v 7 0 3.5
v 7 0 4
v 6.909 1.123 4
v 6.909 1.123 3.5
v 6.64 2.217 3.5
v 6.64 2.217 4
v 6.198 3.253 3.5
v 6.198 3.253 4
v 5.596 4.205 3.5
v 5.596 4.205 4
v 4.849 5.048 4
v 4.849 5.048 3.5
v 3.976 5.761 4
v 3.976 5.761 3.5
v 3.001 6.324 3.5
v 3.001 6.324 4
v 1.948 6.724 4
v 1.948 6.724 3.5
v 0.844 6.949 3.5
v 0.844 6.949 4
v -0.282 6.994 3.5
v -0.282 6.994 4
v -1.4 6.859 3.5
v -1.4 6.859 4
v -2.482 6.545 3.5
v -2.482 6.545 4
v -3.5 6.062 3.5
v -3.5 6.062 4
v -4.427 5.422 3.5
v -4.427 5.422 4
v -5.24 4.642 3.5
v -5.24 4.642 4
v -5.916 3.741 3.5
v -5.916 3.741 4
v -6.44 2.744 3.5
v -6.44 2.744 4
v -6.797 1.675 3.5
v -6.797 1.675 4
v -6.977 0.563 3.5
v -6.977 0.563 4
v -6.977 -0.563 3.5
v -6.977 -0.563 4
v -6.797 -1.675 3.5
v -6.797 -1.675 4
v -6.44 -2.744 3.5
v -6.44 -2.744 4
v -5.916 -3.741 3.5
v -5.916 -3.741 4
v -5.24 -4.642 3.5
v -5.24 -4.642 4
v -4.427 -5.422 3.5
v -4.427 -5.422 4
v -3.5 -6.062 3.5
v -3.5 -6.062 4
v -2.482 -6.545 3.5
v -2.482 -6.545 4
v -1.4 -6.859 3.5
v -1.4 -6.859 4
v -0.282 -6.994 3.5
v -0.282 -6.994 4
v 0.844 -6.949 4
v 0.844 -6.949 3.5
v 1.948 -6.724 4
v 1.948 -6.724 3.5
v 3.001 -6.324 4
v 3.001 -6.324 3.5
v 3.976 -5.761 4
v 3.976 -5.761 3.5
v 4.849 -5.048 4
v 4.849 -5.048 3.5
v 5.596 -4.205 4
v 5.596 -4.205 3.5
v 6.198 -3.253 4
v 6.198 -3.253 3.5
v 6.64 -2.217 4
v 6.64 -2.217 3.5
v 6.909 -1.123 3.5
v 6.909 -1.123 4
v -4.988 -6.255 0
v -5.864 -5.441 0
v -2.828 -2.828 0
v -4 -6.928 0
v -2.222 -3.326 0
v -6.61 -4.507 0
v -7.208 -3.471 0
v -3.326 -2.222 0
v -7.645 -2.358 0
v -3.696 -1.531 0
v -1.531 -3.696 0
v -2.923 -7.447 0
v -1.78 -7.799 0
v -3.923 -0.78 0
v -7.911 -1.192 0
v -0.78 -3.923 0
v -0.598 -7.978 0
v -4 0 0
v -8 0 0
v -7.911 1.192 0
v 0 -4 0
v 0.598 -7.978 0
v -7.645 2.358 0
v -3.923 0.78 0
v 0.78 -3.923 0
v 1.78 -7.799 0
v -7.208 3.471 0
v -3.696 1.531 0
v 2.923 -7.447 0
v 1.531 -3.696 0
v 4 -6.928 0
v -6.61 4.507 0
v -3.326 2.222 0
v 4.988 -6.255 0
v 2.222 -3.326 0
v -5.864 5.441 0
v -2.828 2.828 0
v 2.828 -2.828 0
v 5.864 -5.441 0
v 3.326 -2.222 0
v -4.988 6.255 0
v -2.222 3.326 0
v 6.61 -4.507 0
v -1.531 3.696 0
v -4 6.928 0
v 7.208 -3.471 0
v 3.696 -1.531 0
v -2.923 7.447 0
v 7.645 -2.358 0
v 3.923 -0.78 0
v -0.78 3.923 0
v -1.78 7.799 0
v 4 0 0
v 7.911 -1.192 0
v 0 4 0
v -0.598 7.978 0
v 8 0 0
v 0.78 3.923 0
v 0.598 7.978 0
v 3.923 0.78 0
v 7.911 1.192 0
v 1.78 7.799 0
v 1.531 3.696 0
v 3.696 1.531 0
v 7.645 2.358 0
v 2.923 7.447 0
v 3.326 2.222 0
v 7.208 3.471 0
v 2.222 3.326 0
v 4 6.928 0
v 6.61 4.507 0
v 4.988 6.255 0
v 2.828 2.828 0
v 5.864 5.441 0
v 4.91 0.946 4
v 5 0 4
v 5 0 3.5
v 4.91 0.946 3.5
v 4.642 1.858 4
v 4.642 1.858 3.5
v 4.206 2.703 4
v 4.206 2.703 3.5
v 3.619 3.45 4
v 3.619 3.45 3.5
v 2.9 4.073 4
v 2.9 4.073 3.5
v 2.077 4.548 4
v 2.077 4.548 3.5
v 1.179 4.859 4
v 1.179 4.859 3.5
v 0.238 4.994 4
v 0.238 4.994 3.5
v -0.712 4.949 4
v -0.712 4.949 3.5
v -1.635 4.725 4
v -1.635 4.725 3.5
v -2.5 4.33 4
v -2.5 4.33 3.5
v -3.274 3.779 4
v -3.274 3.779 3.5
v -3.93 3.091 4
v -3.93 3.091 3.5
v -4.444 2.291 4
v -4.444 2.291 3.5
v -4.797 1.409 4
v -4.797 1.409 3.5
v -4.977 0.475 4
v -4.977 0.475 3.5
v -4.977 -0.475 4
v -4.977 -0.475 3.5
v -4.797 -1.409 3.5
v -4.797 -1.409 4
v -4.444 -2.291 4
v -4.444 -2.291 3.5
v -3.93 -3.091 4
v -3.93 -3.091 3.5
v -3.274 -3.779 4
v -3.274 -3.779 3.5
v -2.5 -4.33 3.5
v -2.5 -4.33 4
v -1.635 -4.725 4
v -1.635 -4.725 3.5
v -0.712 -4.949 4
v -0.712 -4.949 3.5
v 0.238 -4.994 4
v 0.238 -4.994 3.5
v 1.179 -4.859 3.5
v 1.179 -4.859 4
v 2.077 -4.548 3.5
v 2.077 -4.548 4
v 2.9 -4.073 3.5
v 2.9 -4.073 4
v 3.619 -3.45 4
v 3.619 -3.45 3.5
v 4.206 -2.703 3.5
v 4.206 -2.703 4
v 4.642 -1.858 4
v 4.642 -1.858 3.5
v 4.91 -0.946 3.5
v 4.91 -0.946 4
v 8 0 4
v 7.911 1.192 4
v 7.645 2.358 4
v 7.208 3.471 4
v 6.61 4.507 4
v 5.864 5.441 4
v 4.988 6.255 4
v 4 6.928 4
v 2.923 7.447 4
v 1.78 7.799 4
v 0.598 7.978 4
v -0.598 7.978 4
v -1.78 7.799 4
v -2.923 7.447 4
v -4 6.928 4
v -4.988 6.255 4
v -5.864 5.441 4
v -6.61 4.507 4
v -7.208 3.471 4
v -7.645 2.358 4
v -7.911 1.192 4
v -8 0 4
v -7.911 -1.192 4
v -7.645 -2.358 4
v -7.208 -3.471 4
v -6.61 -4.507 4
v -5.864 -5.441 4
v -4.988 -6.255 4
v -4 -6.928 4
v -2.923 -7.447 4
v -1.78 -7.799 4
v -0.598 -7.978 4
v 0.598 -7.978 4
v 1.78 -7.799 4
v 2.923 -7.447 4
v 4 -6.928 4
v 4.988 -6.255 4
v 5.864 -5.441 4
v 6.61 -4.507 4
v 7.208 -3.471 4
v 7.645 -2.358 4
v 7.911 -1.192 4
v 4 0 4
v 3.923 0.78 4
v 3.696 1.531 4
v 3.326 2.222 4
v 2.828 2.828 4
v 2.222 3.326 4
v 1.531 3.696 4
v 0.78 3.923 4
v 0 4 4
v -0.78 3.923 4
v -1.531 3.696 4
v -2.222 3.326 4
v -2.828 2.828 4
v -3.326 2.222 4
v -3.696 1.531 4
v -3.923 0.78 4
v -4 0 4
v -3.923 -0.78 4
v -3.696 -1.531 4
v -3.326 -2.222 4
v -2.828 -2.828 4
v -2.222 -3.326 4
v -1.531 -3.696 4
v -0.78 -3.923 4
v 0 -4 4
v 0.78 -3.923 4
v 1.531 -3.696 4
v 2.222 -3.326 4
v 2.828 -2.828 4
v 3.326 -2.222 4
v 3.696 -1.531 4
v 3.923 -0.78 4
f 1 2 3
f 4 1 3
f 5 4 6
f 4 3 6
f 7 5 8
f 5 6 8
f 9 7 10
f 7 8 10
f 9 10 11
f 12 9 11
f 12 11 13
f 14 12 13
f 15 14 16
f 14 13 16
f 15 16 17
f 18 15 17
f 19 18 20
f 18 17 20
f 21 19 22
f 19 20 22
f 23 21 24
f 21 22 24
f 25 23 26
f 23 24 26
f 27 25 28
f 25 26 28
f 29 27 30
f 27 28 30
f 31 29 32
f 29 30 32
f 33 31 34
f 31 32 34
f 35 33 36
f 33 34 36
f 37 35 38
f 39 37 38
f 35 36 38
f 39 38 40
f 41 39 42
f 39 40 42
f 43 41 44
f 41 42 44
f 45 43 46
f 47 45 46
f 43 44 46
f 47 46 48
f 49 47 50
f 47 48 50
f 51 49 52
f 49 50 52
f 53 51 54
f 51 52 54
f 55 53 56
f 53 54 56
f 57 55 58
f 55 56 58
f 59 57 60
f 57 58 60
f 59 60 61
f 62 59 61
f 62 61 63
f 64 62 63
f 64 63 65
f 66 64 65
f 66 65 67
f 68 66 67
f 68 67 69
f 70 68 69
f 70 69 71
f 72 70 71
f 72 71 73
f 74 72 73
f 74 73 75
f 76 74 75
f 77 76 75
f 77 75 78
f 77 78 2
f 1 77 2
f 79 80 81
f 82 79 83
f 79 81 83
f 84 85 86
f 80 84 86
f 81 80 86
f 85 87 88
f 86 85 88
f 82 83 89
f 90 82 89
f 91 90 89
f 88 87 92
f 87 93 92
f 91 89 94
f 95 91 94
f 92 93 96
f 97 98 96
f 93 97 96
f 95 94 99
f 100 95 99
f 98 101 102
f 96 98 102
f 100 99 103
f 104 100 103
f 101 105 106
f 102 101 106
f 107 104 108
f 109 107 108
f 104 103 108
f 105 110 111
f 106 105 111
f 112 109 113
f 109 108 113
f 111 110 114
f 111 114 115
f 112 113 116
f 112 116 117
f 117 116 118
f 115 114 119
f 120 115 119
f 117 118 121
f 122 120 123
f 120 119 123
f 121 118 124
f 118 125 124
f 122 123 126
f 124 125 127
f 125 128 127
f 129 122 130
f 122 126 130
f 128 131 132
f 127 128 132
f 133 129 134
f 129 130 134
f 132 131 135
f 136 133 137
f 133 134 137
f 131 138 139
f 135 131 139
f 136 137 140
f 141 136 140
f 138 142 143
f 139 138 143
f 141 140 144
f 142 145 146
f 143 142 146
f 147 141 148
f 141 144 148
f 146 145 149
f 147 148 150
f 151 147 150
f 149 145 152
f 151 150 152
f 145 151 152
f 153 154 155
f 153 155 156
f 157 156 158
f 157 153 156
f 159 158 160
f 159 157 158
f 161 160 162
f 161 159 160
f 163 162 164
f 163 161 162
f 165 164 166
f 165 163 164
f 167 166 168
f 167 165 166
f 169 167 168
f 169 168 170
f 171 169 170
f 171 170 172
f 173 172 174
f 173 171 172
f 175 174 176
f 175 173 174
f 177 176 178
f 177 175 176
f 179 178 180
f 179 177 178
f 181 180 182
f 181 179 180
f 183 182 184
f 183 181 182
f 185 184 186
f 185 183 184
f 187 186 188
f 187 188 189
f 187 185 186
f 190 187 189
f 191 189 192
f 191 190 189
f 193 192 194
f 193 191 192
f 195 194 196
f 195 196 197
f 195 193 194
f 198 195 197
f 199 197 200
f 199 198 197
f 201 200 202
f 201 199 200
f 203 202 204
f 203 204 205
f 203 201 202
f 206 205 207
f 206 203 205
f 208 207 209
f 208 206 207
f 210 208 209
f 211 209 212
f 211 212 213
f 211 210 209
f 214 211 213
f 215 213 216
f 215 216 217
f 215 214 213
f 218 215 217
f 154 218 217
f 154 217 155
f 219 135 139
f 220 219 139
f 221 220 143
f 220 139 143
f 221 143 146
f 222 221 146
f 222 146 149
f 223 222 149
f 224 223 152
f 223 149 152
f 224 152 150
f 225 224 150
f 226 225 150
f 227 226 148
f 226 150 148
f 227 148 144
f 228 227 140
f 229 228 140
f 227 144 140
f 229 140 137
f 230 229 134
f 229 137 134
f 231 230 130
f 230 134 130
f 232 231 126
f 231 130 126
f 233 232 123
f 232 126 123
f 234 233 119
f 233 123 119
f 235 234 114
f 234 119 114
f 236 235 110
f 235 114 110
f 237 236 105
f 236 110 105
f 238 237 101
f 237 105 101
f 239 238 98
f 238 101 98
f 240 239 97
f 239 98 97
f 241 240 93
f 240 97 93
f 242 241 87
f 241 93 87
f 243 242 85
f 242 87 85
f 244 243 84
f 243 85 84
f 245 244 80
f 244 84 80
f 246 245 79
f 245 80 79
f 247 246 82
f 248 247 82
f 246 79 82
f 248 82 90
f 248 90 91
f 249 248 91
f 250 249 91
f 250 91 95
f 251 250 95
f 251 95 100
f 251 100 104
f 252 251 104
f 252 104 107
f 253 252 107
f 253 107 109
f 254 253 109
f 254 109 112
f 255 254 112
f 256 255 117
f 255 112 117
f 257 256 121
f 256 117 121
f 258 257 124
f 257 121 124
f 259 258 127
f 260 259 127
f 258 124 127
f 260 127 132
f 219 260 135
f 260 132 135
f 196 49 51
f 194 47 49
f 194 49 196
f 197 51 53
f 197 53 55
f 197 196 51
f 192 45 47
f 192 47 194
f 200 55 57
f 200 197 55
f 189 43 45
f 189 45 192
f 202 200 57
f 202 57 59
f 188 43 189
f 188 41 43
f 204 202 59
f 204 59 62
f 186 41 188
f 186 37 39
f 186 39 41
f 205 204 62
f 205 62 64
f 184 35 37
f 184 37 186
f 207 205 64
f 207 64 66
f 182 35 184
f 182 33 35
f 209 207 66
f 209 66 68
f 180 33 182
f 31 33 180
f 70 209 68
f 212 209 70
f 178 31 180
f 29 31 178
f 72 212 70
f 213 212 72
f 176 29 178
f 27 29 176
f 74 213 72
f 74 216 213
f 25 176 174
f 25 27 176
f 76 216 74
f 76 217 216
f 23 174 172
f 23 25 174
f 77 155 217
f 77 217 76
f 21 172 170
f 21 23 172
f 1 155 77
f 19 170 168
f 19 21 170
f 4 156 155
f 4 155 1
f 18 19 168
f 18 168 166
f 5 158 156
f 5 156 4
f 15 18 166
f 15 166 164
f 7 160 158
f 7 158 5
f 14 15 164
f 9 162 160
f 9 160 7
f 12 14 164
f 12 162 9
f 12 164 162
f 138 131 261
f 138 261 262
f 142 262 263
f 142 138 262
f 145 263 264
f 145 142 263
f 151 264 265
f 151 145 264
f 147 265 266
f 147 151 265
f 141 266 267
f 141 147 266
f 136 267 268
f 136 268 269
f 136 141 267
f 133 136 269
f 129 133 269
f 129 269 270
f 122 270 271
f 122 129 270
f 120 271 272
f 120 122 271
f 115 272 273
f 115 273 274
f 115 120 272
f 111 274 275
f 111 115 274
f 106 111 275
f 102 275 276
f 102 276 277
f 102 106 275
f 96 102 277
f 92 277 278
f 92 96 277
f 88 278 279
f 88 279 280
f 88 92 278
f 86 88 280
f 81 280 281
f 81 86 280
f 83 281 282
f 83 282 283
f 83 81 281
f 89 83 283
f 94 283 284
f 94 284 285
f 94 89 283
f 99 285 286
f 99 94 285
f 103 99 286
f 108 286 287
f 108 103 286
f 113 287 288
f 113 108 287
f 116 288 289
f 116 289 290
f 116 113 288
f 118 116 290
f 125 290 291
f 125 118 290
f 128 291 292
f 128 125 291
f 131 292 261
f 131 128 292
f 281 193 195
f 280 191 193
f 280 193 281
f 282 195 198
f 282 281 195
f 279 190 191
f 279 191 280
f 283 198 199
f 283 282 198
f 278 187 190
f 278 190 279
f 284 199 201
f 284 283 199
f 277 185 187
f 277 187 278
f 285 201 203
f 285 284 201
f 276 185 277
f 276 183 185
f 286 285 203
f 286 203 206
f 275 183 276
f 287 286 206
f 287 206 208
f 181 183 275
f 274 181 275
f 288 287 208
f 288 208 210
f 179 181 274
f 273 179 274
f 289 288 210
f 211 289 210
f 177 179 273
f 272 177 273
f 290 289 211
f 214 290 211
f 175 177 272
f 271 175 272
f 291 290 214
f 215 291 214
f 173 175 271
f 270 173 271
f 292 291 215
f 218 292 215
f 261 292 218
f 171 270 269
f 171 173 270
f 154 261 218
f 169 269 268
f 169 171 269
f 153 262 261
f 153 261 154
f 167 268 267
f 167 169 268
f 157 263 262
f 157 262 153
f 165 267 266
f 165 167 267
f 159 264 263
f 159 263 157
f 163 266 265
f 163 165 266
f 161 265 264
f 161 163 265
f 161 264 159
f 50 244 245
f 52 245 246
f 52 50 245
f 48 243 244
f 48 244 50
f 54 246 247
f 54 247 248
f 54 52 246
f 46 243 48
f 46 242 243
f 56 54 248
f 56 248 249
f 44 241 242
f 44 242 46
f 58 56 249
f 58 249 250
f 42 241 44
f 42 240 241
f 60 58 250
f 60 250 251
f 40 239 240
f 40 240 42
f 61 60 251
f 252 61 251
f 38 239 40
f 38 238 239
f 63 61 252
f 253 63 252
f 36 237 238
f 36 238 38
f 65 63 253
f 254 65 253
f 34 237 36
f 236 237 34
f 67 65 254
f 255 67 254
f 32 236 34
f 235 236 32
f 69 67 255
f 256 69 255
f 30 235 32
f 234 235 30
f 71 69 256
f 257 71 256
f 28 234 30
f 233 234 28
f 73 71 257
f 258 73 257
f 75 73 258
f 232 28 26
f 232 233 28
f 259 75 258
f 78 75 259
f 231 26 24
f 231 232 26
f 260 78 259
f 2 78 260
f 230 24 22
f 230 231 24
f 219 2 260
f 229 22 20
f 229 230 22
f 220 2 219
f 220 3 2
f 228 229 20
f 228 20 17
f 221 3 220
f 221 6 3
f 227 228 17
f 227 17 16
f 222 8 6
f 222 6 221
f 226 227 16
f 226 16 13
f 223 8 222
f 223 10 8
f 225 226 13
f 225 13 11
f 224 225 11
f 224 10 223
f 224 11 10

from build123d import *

# Parameters (mm, degrees)
SKETCH016_R     = 8
SKETCH016_R_2   = 4
PAD009_DEPTH    = 4
SKETCH017_R     = 7
SKETCH017_R_2   = 5
POCKET008_DEPTH = 0.5
SKETCH018_R     = 20
SKETCH018_R_2   = 16
POCKET009_DEPTH = 0.5


with BuildPart() as part:
    # Sketch016 → Pad009 (new body)
    with BuildSketch(Plane.XY):
        Circle(SKETCH016_R)
        Circle(SKETCH016_R_2, mode=Mode.SUBTRACT)
    extrude(amount=PAD009_DEPTH)

    # Sketch017 → Pocket008 (cut)
    with BuildSketch(Plane.XY.offset(4)):
        Circle(SKETCH017_R)
        Circle(SKETCH017_R_2, mode=Mode.SUBTRACT)
    extrude(amount=-POCKET008_DEPTH, mode=Mode.SUBTRACT)

    # Sketch018 → Pocket009 (cut)
    with BuildSketch(Plane.XY):
        Circle(SKETCH018_R)
        Circle(SKETCH018_R_2, mode=Mode.SUBTRACT)
    extrude(amount=POCKET009_DEPTH, mode=Mode.SUBTRACT)


solid = part.part
